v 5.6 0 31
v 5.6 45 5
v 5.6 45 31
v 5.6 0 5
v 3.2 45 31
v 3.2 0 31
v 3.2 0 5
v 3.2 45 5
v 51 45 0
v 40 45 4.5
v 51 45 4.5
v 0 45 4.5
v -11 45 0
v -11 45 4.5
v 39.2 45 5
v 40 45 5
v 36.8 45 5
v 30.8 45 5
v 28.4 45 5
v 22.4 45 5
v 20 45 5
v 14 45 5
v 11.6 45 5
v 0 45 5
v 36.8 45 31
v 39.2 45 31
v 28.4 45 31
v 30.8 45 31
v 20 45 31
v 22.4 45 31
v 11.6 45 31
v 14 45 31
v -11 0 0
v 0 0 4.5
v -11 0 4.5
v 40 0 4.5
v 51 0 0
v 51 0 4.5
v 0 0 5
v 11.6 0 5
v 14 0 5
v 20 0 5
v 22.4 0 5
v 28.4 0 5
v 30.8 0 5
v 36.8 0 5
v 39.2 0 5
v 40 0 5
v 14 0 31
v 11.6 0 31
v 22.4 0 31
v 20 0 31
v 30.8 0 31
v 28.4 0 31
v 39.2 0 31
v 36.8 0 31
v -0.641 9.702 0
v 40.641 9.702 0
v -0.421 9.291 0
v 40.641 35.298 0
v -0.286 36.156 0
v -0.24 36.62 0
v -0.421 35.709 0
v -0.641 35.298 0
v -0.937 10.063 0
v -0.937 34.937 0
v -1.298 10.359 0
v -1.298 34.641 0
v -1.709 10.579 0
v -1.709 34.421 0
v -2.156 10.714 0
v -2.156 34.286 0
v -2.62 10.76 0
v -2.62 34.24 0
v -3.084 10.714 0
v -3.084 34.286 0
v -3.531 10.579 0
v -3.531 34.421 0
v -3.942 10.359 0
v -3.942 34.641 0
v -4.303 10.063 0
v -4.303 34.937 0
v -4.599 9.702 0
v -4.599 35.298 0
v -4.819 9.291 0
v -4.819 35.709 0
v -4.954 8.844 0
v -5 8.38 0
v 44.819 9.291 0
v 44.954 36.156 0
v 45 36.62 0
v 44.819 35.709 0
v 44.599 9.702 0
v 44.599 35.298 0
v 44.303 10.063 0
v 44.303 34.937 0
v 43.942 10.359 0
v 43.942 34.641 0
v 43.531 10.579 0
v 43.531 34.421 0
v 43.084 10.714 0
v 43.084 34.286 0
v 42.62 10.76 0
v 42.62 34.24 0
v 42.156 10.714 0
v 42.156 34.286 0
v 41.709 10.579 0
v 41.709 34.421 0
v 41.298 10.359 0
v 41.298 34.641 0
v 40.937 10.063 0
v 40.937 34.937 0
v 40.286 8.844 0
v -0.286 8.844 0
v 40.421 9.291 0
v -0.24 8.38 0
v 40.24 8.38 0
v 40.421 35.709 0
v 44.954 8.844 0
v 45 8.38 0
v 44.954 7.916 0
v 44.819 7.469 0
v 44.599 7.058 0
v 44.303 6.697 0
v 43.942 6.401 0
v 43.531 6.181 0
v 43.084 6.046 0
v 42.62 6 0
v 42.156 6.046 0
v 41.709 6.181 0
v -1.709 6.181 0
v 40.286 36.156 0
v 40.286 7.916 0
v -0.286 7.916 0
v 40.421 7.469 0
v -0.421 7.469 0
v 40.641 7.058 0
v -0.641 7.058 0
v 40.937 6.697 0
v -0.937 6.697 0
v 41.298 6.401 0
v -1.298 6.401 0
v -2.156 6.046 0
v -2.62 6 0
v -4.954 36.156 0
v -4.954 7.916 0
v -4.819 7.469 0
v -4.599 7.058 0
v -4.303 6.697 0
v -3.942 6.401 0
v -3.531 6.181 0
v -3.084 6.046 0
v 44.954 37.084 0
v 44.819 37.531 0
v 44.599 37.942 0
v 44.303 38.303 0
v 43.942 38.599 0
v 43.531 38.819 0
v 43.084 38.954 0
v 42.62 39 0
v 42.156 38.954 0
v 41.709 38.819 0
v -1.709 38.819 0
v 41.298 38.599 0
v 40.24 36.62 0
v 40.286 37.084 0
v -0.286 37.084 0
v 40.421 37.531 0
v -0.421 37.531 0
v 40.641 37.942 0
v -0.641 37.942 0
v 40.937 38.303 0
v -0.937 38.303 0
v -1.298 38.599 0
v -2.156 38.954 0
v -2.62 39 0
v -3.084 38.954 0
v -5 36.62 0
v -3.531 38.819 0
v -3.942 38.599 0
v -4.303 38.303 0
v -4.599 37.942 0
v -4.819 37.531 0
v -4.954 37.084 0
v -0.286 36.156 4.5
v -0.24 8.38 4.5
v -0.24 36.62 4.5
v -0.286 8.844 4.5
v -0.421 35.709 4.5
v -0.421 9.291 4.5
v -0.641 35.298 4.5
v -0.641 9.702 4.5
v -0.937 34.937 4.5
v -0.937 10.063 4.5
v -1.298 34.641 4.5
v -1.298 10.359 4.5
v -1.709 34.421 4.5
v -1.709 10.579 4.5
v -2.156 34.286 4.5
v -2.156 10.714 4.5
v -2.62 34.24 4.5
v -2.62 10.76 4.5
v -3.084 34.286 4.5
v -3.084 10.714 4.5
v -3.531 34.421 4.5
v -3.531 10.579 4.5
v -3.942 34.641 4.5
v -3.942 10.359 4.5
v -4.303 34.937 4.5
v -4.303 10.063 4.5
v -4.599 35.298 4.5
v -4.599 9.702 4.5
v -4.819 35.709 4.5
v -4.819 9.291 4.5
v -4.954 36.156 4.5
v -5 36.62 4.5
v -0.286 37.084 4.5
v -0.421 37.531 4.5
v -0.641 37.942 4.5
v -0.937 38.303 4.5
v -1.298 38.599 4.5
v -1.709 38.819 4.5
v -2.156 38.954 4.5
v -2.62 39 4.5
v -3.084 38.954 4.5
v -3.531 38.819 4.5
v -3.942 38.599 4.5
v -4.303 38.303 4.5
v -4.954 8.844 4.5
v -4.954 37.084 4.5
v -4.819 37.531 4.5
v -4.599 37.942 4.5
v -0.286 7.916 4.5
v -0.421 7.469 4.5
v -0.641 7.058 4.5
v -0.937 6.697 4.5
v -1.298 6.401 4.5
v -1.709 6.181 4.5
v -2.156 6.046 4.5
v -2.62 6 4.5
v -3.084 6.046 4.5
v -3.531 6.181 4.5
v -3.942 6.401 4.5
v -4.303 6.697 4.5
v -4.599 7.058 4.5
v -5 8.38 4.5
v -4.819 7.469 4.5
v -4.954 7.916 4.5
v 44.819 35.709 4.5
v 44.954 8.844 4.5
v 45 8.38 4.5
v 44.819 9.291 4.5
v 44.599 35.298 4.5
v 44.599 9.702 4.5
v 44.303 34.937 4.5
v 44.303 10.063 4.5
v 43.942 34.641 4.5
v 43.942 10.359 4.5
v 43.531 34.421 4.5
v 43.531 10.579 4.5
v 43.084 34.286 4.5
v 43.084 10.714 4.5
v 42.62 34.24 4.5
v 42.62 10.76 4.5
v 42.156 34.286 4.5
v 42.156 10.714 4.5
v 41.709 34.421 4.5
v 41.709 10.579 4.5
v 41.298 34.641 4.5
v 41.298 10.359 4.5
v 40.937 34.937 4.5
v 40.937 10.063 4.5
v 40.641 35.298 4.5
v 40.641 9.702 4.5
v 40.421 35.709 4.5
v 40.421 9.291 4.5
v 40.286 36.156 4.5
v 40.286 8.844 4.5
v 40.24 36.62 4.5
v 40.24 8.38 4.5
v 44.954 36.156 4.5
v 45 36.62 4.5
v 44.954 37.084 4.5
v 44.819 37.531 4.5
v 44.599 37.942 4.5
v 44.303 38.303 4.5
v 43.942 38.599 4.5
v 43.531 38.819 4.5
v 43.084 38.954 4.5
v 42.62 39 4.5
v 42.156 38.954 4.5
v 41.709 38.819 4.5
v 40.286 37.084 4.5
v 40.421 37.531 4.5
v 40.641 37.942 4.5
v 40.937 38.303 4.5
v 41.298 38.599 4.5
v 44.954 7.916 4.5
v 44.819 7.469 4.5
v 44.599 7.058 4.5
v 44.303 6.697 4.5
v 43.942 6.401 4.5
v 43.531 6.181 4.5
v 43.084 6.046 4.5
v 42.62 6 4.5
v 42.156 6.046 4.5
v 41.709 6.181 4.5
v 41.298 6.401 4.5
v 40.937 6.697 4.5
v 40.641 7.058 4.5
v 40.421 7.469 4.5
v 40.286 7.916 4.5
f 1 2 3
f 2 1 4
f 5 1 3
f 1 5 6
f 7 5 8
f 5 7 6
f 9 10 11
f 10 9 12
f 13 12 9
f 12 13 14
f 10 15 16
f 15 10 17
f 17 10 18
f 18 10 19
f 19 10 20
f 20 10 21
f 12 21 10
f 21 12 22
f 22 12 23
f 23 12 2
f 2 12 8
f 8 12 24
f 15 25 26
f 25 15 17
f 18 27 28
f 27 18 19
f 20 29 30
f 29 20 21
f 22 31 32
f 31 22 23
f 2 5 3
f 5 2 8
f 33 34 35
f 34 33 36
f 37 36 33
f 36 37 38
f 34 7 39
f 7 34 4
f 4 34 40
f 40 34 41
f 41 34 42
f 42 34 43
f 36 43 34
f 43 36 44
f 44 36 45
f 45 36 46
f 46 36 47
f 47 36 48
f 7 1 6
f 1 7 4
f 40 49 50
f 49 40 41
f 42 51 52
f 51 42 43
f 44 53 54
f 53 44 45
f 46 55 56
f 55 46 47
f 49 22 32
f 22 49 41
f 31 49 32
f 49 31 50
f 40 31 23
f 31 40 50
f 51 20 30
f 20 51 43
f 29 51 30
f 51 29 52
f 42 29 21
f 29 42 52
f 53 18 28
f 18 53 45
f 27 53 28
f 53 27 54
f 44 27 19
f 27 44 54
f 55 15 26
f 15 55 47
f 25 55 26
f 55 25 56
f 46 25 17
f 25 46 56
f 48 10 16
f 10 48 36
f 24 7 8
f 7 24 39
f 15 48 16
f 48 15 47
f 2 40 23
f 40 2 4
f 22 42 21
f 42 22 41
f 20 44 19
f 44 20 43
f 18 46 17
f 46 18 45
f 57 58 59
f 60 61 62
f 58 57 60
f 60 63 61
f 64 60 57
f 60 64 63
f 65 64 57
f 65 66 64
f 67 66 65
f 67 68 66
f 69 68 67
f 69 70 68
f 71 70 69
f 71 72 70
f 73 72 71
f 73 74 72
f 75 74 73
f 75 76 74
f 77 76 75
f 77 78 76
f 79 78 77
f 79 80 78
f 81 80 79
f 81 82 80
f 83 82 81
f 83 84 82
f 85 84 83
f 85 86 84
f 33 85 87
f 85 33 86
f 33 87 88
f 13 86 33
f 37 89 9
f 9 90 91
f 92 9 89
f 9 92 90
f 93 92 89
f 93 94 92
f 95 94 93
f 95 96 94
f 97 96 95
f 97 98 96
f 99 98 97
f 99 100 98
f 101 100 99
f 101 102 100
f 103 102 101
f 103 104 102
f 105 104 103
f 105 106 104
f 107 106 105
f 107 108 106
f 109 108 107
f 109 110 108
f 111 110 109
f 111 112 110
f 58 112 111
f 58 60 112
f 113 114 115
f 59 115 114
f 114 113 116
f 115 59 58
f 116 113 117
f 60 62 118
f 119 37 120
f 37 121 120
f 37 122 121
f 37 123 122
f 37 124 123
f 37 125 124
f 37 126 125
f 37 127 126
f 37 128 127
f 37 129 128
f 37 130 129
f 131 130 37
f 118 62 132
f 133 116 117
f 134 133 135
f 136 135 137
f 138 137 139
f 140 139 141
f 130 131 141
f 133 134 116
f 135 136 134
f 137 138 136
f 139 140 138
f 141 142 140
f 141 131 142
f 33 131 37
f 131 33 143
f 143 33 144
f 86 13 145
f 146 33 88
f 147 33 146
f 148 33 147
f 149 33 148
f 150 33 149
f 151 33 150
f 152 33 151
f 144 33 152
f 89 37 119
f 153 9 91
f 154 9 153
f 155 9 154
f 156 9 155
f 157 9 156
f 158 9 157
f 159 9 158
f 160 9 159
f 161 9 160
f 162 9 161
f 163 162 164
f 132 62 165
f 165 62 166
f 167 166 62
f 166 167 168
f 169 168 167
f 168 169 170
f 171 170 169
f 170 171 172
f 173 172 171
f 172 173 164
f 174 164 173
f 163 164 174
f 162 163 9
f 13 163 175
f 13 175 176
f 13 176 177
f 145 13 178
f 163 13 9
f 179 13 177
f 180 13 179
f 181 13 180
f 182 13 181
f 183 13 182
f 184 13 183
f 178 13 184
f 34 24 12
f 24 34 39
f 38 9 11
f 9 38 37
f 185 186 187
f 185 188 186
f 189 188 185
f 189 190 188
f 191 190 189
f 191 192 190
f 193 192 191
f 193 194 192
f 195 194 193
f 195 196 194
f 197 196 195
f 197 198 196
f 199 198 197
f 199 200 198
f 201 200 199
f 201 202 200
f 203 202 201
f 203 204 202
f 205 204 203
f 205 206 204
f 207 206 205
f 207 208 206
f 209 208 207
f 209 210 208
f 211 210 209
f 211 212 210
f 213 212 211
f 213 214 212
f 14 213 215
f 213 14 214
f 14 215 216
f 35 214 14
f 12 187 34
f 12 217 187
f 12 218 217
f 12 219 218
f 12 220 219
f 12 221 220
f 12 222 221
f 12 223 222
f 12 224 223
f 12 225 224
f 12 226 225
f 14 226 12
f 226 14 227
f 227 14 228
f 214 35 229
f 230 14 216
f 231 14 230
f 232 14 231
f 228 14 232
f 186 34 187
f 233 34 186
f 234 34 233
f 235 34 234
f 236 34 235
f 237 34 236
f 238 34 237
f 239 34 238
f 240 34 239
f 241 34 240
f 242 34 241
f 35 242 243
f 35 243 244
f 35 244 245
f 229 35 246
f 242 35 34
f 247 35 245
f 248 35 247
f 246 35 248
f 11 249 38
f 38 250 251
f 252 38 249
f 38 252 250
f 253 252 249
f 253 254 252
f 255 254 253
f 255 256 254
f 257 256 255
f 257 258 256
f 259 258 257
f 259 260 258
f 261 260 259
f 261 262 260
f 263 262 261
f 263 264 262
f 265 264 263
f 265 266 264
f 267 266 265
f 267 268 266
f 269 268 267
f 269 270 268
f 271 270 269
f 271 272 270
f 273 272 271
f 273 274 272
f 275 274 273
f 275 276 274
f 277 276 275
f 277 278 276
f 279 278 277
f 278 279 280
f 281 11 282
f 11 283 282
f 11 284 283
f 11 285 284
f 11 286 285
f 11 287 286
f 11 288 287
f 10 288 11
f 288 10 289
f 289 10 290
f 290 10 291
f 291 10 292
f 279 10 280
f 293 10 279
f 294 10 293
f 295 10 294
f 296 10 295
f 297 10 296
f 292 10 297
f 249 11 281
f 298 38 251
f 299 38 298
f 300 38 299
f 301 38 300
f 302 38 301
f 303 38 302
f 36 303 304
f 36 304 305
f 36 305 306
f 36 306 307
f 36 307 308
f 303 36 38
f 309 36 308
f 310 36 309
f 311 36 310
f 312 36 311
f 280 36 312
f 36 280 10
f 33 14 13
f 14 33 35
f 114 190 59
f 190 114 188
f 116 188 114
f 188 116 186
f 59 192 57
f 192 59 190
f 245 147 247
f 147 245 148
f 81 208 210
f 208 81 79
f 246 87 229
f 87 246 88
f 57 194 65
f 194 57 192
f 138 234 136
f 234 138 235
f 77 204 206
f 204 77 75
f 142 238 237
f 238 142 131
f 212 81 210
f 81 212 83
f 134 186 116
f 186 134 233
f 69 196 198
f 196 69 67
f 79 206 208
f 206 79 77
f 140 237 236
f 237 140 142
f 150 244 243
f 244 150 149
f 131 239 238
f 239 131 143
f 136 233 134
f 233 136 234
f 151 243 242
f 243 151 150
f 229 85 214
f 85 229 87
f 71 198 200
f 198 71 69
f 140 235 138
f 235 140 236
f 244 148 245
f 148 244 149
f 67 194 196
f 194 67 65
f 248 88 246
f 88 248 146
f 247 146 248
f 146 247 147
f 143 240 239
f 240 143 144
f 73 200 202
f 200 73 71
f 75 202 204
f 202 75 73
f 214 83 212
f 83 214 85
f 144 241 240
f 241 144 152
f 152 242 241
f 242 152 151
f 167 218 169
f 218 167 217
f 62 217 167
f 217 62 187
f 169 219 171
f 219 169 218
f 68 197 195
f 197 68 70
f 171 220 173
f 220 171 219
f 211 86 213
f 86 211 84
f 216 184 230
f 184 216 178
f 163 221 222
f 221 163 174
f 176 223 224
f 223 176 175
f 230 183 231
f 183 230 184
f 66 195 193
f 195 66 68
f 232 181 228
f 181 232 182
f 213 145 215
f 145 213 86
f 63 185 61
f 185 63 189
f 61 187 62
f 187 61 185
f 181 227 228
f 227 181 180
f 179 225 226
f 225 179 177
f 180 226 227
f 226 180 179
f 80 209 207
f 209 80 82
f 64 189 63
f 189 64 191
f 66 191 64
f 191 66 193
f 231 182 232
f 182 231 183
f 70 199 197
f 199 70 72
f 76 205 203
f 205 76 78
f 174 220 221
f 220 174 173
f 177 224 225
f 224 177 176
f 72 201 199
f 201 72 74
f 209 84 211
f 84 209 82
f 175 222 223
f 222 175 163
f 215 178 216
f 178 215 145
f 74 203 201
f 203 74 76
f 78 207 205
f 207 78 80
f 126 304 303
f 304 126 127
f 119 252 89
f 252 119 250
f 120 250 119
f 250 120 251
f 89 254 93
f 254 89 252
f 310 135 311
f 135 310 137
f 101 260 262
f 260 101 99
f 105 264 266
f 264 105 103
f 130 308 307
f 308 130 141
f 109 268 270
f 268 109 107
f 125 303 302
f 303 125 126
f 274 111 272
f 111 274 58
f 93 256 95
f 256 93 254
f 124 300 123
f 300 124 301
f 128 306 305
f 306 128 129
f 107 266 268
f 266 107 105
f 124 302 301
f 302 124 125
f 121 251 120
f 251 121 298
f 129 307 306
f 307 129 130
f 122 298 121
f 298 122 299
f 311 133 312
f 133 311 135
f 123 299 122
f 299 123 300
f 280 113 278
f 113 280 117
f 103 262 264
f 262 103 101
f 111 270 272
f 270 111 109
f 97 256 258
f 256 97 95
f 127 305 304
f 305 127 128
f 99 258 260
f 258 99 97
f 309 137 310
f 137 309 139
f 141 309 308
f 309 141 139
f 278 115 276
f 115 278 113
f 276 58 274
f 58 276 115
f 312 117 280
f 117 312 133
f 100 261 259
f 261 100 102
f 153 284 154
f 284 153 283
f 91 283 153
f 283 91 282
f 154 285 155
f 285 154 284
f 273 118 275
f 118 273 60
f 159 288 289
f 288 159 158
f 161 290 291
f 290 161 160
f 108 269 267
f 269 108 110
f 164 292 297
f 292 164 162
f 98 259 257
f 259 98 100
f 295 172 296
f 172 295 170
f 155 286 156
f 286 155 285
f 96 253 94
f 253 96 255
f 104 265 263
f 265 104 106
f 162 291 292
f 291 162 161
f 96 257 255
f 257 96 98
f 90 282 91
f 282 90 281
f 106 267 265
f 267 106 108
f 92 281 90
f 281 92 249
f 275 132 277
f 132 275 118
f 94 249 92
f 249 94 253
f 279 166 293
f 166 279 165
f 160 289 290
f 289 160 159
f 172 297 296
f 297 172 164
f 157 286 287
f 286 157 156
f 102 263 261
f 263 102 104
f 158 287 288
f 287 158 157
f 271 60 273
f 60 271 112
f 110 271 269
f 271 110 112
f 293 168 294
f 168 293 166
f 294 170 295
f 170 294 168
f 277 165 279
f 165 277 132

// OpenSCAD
$fn = 32;

// ----------------------------------------------------------------------
// Finned heat sink: 40 x 45 mm base, 26 mm fins
// ----------------------------------------------------------------------

// --- parameters (mm) ---
base_w = 40;              // base width
base_d = 45;              // base depth
base_t = 5;               // base thickness
fin_h = 26;               // fin height above the base
holes_d = 4.76;           // fixing holes
hole_x = 22.62;           // hole offset in x
hole_y = 14.12;           // hole offset in y
fin_t = 2.4;              // fin thickness
fin_pitch = 8.4;          // fin pitch
fin_count = 5;            // number of fins
fin_x0 = 3.2;             // first fin offset
flange_w = 62;            // flange plate width
flange_t = 4;             // flange plate thickness

difference() {
  union() {
    cube([base_w, base_d, base_t]);
    for (i = [0 : fin_count - 1]) {
      translate([fin_x0 + i * fin_pitch, 0, base_t - 0.5]) cube([fin_t, base_d, fin_h + 0.5]);
    }
    /* mounting flange, a wider plate sharing the base bottom */
    translate([(base_w - flange_w) / 2, 0, 0]) cube([flange_w, base_d, flange_t + 0.5]);
  }
  /* fixing holes through the base, 2.5 mm clear on both sides */
  for (hx = [-22.62, 22.62]) {
    for (hy = [-14.12, 14.12]) {
      translate([base_w / 2 + hx, base_d / 2 + hy, -2.5]) cylinder(h = base_t + 5, d = holes_d);
    }
  }
}
